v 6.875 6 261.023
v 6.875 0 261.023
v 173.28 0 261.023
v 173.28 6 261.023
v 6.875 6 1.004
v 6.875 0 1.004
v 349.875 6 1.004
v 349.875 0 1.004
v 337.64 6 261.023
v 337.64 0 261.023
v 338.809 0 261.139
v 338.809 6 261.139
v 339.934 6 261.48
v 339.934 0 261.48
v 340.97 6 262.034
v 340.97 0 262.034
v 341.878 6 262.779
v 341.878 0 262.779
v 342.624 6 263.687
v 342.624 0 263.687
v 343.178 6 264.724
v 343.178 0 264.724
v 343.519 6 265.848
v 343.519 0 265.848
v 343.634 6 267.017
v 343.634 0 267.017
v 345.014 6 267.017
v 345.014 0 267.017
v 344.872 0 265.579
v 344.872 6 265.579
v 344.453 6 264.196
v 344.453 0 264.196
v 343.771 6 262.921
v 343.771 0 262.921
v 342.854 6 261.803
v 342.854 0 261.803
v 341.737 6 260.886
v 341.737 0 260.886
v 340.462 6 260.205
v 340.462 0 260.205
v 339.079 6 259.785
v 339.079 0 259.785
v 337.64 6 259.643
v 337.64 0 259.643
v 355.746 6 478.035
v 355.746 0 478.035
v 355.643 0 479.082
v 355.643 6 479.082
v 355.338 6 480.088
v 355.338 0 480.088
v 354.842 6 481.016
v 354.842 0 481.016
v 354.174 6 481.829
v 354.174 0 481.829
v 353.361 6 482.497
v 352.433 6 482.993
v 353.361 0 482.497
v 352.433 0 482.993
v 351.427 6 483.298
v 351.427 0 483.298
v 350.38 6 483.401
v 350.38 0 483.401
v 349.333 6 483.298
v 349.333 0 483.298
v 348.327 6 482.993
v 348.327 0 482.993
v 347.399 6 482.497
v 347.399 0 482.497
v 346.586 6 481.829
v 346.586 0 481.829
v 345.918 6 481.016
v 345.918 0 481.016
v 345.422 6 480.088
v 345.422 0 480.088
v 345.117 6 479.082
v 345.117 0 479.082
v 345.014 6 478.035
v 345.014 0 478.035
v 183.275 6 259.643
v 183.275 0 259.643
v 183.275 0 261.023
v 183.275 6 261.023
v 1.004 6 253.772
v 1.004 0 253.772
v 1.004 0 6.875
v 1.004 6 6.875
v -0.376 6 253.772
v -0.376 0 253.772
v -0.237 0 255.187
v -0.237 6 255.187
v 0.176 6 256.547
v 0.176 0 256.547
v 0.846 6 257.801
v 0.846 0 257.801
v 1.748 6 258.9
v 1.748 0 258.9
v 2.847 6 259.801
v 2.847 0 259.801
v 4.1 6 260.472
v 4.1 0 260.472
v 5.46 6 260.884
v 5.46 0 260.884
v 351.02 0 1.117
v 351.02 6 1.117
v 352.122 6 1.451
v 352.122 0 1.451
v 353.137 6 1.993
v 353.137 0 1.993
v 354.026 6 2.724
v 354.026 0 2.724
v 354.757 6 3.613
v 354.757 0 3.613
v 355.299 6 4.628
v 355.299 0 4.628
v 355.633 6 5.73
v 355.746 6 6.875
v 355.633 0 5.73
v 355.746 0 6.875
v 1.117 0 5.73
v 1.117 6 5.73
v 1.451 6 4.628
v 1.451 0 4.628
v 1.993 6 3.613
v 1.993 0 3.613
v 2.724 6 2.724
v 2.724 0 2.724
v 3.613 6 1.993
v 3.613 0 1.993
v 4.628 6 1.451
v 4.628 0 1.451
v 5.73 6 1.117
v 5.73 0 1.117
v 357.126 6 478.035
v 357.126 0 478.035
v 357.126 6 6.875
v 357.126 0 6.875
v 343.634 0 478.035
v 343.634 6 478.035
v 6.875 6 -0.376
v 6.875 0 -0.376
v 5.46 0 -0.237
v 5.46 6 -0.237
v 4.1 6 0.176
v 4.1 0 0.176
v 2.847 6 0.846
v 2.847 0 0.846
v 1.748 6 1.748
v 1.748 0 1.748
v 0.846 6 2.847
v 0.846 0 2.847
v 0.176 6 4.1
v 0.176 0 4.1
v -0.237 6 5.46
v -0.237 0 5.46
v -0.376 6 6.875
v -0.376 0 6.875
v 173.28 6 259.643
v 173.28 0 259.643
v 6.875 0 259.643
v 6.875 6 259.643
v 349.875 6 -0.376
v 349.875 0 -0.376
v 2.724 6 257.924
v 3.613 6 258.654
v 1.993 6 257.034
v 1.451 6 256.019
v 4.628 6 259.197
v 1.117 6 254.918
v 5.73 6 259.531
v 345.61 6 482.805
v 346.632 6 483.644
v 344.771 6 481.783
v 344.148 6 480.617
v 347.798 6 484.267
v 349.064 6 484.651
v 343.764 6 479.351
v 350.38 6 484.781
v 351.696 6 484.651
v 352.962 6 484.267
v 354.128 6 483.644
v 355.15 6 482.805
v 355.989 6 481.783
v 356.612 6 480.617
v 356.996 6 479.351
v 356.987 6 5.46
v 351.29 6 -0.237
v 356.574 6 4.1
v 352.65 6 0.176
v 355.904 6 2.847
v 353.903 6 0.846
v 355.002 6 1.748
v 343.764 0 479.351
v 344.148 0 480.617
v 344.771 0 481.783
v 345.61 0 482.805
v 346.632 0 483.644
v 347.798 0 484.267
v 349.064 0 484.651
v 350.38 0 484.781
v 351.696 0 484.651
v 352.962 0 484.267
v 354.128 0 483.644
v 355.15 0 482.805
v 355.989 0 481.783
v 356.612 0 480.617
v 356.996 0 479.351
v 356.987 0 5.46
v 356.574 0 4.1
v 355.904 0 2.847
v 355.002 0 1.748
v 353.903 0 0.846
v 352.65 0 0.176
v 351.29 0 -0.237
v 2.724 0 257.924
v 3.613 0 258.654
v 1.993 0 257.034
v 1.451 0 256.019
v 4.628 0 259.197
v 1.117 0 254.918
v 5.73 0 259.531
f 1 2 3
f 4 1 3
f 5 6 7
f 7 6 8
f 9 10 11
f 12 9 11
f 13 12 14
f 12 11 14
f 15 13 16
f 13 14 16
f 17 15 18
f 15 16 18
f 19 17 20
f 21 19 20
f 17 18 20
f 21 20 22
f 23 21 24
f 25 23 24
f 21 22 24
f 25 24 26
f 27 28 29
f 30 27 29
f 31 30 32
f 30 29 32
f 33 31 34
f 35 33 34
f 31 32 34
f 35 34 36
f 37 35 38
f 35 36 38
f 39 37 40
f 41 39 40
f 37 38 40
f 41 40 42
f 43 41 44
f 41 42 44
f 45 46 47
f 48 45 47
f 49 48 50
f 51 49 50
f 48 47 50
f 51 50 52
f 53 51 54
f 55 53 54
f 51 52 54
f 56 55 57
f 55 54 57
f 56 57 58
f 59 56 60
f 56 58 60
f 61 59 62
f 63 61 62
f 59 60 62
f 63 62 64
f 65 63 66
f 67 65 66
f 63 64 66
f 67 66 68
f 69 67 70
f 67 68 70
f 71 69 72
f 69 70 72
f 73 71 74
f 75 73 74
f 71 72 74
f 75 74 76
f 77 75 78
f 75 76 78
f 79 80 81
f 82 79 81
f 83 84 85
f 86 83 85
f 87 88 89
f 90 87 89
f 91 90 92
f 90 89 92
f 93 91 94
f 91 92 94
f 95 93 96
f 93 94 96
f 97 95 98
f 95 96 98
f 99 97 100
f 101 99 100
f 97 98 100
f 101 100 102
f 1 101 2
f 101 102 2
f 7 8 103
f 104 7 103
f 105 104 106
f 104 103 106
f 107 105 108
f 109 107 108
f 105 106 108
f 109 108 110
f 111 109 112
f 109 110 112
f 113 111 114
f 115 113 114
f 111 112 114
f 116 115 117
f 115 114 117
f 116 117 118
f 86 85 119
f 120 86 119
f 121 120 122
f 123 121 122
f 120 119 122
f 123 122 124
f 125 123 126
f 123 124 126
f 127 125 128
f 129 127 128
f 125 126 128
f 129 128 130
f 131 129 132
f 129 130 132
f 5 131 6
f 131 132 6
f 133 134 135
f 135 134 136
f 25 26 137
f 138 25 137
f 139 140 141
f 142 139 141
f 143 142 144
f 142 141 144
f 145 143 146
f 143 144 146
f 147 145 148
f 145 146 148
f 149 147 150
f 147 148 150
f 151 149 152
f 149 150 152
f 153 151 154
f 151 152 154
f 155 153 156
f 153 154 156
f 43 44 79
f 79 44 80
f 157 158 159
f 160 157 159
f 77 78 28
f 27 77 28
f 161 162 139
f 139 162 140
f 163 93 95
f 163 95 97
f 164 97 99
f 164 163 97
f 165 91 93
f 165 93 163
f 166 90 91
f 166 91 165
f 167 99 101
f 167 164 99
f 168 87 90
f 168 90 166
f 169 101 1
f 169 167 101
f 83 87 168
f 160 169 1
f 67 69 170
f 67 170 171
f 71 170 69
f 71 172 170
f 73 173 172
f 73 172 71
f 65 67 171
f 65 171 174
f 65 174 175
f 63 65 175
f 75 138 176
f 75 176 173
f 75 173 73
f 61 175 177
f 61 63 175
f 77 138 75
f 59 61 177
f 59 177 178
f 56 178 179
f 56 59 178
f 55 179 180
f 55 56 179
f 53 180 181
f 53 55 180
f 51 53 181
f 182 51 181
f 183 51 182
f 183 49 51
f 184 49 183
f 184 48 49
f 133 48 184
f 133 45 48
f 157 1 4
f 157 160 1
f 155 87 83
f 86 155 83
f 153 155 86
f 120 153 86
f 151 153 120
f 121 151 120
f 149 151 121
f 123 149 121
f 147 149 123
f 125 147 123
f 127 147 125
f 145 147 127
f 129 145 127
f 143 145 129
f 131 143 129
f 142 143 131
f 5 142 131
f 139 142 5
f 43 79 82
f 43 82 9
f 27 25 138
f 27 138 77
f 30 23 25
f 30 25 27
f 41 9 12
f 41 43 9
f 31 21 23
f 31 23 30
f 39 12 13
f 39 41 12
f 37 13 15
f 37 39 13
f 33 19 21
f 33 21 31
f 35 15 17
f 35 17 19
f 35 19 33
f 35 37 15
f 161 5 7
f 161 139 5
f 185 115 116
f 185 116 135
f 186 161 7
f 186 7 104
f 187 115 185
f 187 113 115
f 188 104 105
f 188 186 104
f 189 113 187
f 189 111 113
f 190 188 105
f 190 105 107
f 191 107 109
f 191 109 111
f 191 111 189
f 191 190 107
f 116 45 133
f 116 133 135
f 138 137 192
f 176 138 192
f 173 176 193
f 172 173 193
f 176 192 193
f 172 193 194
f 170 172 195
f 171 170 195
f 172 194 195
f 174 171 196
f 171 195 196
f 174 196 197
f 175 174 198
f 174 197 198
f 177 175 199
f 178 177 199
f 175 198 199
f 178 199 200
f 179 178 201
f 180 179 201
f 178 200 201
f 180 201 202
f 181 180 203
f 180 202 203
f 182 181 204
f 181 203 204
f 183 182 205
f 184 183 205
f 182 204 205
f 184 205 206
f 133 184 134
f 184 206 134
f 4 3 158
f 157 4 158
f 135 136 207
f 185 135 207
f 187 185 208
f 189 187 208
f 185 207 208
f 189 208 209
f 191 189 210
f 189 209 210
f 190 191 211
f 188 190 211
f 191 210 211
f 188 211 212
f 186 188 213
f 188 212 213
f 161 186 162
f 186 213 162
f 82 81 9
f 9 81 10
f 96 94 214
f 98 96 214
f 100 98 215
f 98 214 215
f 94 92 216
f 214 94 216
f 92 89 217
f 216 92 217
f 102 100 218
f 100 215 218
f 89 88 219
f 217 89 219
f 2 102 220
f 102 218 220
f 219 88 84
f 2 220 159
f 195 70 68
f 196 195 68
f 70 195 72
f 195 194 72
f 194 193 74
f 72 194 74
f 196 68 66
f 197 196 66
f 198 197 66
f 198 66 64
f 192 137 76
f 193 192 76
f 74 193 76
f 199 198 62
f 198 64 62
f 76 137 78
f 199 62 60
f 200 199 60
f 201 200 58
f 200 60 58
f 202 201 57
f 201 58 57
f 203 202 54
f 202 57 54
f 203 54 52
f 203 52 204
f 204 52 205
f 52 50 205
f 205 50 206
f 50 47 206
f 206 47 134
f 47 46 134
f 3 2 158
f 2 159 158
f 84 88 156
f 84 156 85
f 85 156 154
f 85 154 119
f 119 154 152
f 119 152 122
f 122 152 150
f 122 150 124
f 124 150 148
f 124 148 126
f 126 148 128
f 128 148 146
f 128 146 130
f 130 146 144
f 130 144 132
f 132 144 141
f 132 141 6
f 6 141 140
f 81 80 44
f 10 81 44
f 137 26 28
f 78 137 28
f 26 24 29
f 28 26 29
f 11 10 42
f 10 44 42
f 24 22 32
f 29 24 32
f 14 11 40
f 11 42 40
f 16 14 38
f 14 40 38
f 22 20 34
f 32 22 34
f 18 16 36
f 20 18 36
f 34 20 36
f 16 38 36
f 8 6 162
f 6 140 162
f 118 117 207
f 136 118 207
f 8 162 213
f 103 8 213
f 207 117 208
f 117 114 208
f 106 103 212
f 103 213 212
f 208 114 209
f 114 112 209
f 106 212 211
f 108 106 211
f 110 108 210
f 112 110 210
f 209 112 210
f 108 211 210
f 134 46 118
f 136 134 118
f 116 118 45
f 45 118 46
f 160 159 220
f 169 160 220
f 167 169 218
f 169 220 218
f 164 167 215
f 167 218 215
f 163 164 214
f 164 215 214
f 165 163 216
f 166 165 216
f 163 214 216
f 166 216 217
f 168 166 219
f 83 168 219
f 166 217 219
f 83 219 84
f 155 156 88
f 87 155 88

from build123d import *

# Parameters (mm, degrees)
EXTRUDE_THIN1_DEPTH = 6


with BuildPart() as part:
    # Sketch1 → Extrude-Thin1 (new body)
    with BuildSketch(Plane(origin=(0, 0, 0), x_dir=(1, 0, 0), z_dir=(0, 1, 0))):
        with BuildLine():
            Line((173.28, -259.643481844), (6.875, -259.643481844))
            ThreePointArc((6.875, -259.643481844), (2.723576088, -257.923905757), (1.004, -253.772481844))
            Line((1.004, -253.772481844), (1.004, -6.875))
            ThreePointArc((1.004, -6.875), (2.723576088, -2.723576088), (6.875, -1.004))
            Line((6.875, -1.004), (349.875, -1.004))
            ThreePointArc((349.875, -1.004), (354.026423912, -2.723576088), (355.746, -6.875))
            Line((355.746, -6.875), (355.746, -478.035))
            ThreePointArc((355.746, -478.035), (350.38, -483.401), (345.014, -478.035))
            Line((345.014, -478.035), (345.014, -267.017481844))
            ThreePointArc((345.014, -267.017481844), (342.854205404, -261.80327644), (337.64, -259.643481844))
            Line((337.64, -259.643481844), (183.275, -259.643481844))
            Line((183.275, -259.643481844), (183.275, -261.023481844))
            Line((183.275, -261.023481844), (337.64, -261.023481844))
            ThreePointArc((337.64, -261.023481844), (341.878398046, -262.779083798), (343.634, -267.017481844))
            Line((343.634, -267.017481844), (343.634, -478.035))
            ThreePointArc((343.634, -478.035), (350.38, -484.781), (357.126, -478.035))
            Line((357.126, -478.035), (357.126, -6.875))
            ThreePointArc((357.126, -6.875), (355.00223127, -1.74776873), (349.875, 0.376))
            Line((349.875, 0.376), (6.875, 0.376))
            ThreePointArc((6.875, 0.376), (1.74776873, -1.74776873), (-0.376, -6.875))
            Line((-0.376, -6.875), (-0.376, -253.772481844))
            ThreePointArc((-0.376, -253.772481844), (1.74776873, -258.899713115), (6.875, -261.023481844))
            Line((6.875, -261.023481844), (173.28, -261.023481844))
            Line((173.28, -261.023481844), (173.28, -259.643481844))
        make_face()
    extrude(amount=EXTRUDE_THIN1_DEPTH)


solid = part.part
